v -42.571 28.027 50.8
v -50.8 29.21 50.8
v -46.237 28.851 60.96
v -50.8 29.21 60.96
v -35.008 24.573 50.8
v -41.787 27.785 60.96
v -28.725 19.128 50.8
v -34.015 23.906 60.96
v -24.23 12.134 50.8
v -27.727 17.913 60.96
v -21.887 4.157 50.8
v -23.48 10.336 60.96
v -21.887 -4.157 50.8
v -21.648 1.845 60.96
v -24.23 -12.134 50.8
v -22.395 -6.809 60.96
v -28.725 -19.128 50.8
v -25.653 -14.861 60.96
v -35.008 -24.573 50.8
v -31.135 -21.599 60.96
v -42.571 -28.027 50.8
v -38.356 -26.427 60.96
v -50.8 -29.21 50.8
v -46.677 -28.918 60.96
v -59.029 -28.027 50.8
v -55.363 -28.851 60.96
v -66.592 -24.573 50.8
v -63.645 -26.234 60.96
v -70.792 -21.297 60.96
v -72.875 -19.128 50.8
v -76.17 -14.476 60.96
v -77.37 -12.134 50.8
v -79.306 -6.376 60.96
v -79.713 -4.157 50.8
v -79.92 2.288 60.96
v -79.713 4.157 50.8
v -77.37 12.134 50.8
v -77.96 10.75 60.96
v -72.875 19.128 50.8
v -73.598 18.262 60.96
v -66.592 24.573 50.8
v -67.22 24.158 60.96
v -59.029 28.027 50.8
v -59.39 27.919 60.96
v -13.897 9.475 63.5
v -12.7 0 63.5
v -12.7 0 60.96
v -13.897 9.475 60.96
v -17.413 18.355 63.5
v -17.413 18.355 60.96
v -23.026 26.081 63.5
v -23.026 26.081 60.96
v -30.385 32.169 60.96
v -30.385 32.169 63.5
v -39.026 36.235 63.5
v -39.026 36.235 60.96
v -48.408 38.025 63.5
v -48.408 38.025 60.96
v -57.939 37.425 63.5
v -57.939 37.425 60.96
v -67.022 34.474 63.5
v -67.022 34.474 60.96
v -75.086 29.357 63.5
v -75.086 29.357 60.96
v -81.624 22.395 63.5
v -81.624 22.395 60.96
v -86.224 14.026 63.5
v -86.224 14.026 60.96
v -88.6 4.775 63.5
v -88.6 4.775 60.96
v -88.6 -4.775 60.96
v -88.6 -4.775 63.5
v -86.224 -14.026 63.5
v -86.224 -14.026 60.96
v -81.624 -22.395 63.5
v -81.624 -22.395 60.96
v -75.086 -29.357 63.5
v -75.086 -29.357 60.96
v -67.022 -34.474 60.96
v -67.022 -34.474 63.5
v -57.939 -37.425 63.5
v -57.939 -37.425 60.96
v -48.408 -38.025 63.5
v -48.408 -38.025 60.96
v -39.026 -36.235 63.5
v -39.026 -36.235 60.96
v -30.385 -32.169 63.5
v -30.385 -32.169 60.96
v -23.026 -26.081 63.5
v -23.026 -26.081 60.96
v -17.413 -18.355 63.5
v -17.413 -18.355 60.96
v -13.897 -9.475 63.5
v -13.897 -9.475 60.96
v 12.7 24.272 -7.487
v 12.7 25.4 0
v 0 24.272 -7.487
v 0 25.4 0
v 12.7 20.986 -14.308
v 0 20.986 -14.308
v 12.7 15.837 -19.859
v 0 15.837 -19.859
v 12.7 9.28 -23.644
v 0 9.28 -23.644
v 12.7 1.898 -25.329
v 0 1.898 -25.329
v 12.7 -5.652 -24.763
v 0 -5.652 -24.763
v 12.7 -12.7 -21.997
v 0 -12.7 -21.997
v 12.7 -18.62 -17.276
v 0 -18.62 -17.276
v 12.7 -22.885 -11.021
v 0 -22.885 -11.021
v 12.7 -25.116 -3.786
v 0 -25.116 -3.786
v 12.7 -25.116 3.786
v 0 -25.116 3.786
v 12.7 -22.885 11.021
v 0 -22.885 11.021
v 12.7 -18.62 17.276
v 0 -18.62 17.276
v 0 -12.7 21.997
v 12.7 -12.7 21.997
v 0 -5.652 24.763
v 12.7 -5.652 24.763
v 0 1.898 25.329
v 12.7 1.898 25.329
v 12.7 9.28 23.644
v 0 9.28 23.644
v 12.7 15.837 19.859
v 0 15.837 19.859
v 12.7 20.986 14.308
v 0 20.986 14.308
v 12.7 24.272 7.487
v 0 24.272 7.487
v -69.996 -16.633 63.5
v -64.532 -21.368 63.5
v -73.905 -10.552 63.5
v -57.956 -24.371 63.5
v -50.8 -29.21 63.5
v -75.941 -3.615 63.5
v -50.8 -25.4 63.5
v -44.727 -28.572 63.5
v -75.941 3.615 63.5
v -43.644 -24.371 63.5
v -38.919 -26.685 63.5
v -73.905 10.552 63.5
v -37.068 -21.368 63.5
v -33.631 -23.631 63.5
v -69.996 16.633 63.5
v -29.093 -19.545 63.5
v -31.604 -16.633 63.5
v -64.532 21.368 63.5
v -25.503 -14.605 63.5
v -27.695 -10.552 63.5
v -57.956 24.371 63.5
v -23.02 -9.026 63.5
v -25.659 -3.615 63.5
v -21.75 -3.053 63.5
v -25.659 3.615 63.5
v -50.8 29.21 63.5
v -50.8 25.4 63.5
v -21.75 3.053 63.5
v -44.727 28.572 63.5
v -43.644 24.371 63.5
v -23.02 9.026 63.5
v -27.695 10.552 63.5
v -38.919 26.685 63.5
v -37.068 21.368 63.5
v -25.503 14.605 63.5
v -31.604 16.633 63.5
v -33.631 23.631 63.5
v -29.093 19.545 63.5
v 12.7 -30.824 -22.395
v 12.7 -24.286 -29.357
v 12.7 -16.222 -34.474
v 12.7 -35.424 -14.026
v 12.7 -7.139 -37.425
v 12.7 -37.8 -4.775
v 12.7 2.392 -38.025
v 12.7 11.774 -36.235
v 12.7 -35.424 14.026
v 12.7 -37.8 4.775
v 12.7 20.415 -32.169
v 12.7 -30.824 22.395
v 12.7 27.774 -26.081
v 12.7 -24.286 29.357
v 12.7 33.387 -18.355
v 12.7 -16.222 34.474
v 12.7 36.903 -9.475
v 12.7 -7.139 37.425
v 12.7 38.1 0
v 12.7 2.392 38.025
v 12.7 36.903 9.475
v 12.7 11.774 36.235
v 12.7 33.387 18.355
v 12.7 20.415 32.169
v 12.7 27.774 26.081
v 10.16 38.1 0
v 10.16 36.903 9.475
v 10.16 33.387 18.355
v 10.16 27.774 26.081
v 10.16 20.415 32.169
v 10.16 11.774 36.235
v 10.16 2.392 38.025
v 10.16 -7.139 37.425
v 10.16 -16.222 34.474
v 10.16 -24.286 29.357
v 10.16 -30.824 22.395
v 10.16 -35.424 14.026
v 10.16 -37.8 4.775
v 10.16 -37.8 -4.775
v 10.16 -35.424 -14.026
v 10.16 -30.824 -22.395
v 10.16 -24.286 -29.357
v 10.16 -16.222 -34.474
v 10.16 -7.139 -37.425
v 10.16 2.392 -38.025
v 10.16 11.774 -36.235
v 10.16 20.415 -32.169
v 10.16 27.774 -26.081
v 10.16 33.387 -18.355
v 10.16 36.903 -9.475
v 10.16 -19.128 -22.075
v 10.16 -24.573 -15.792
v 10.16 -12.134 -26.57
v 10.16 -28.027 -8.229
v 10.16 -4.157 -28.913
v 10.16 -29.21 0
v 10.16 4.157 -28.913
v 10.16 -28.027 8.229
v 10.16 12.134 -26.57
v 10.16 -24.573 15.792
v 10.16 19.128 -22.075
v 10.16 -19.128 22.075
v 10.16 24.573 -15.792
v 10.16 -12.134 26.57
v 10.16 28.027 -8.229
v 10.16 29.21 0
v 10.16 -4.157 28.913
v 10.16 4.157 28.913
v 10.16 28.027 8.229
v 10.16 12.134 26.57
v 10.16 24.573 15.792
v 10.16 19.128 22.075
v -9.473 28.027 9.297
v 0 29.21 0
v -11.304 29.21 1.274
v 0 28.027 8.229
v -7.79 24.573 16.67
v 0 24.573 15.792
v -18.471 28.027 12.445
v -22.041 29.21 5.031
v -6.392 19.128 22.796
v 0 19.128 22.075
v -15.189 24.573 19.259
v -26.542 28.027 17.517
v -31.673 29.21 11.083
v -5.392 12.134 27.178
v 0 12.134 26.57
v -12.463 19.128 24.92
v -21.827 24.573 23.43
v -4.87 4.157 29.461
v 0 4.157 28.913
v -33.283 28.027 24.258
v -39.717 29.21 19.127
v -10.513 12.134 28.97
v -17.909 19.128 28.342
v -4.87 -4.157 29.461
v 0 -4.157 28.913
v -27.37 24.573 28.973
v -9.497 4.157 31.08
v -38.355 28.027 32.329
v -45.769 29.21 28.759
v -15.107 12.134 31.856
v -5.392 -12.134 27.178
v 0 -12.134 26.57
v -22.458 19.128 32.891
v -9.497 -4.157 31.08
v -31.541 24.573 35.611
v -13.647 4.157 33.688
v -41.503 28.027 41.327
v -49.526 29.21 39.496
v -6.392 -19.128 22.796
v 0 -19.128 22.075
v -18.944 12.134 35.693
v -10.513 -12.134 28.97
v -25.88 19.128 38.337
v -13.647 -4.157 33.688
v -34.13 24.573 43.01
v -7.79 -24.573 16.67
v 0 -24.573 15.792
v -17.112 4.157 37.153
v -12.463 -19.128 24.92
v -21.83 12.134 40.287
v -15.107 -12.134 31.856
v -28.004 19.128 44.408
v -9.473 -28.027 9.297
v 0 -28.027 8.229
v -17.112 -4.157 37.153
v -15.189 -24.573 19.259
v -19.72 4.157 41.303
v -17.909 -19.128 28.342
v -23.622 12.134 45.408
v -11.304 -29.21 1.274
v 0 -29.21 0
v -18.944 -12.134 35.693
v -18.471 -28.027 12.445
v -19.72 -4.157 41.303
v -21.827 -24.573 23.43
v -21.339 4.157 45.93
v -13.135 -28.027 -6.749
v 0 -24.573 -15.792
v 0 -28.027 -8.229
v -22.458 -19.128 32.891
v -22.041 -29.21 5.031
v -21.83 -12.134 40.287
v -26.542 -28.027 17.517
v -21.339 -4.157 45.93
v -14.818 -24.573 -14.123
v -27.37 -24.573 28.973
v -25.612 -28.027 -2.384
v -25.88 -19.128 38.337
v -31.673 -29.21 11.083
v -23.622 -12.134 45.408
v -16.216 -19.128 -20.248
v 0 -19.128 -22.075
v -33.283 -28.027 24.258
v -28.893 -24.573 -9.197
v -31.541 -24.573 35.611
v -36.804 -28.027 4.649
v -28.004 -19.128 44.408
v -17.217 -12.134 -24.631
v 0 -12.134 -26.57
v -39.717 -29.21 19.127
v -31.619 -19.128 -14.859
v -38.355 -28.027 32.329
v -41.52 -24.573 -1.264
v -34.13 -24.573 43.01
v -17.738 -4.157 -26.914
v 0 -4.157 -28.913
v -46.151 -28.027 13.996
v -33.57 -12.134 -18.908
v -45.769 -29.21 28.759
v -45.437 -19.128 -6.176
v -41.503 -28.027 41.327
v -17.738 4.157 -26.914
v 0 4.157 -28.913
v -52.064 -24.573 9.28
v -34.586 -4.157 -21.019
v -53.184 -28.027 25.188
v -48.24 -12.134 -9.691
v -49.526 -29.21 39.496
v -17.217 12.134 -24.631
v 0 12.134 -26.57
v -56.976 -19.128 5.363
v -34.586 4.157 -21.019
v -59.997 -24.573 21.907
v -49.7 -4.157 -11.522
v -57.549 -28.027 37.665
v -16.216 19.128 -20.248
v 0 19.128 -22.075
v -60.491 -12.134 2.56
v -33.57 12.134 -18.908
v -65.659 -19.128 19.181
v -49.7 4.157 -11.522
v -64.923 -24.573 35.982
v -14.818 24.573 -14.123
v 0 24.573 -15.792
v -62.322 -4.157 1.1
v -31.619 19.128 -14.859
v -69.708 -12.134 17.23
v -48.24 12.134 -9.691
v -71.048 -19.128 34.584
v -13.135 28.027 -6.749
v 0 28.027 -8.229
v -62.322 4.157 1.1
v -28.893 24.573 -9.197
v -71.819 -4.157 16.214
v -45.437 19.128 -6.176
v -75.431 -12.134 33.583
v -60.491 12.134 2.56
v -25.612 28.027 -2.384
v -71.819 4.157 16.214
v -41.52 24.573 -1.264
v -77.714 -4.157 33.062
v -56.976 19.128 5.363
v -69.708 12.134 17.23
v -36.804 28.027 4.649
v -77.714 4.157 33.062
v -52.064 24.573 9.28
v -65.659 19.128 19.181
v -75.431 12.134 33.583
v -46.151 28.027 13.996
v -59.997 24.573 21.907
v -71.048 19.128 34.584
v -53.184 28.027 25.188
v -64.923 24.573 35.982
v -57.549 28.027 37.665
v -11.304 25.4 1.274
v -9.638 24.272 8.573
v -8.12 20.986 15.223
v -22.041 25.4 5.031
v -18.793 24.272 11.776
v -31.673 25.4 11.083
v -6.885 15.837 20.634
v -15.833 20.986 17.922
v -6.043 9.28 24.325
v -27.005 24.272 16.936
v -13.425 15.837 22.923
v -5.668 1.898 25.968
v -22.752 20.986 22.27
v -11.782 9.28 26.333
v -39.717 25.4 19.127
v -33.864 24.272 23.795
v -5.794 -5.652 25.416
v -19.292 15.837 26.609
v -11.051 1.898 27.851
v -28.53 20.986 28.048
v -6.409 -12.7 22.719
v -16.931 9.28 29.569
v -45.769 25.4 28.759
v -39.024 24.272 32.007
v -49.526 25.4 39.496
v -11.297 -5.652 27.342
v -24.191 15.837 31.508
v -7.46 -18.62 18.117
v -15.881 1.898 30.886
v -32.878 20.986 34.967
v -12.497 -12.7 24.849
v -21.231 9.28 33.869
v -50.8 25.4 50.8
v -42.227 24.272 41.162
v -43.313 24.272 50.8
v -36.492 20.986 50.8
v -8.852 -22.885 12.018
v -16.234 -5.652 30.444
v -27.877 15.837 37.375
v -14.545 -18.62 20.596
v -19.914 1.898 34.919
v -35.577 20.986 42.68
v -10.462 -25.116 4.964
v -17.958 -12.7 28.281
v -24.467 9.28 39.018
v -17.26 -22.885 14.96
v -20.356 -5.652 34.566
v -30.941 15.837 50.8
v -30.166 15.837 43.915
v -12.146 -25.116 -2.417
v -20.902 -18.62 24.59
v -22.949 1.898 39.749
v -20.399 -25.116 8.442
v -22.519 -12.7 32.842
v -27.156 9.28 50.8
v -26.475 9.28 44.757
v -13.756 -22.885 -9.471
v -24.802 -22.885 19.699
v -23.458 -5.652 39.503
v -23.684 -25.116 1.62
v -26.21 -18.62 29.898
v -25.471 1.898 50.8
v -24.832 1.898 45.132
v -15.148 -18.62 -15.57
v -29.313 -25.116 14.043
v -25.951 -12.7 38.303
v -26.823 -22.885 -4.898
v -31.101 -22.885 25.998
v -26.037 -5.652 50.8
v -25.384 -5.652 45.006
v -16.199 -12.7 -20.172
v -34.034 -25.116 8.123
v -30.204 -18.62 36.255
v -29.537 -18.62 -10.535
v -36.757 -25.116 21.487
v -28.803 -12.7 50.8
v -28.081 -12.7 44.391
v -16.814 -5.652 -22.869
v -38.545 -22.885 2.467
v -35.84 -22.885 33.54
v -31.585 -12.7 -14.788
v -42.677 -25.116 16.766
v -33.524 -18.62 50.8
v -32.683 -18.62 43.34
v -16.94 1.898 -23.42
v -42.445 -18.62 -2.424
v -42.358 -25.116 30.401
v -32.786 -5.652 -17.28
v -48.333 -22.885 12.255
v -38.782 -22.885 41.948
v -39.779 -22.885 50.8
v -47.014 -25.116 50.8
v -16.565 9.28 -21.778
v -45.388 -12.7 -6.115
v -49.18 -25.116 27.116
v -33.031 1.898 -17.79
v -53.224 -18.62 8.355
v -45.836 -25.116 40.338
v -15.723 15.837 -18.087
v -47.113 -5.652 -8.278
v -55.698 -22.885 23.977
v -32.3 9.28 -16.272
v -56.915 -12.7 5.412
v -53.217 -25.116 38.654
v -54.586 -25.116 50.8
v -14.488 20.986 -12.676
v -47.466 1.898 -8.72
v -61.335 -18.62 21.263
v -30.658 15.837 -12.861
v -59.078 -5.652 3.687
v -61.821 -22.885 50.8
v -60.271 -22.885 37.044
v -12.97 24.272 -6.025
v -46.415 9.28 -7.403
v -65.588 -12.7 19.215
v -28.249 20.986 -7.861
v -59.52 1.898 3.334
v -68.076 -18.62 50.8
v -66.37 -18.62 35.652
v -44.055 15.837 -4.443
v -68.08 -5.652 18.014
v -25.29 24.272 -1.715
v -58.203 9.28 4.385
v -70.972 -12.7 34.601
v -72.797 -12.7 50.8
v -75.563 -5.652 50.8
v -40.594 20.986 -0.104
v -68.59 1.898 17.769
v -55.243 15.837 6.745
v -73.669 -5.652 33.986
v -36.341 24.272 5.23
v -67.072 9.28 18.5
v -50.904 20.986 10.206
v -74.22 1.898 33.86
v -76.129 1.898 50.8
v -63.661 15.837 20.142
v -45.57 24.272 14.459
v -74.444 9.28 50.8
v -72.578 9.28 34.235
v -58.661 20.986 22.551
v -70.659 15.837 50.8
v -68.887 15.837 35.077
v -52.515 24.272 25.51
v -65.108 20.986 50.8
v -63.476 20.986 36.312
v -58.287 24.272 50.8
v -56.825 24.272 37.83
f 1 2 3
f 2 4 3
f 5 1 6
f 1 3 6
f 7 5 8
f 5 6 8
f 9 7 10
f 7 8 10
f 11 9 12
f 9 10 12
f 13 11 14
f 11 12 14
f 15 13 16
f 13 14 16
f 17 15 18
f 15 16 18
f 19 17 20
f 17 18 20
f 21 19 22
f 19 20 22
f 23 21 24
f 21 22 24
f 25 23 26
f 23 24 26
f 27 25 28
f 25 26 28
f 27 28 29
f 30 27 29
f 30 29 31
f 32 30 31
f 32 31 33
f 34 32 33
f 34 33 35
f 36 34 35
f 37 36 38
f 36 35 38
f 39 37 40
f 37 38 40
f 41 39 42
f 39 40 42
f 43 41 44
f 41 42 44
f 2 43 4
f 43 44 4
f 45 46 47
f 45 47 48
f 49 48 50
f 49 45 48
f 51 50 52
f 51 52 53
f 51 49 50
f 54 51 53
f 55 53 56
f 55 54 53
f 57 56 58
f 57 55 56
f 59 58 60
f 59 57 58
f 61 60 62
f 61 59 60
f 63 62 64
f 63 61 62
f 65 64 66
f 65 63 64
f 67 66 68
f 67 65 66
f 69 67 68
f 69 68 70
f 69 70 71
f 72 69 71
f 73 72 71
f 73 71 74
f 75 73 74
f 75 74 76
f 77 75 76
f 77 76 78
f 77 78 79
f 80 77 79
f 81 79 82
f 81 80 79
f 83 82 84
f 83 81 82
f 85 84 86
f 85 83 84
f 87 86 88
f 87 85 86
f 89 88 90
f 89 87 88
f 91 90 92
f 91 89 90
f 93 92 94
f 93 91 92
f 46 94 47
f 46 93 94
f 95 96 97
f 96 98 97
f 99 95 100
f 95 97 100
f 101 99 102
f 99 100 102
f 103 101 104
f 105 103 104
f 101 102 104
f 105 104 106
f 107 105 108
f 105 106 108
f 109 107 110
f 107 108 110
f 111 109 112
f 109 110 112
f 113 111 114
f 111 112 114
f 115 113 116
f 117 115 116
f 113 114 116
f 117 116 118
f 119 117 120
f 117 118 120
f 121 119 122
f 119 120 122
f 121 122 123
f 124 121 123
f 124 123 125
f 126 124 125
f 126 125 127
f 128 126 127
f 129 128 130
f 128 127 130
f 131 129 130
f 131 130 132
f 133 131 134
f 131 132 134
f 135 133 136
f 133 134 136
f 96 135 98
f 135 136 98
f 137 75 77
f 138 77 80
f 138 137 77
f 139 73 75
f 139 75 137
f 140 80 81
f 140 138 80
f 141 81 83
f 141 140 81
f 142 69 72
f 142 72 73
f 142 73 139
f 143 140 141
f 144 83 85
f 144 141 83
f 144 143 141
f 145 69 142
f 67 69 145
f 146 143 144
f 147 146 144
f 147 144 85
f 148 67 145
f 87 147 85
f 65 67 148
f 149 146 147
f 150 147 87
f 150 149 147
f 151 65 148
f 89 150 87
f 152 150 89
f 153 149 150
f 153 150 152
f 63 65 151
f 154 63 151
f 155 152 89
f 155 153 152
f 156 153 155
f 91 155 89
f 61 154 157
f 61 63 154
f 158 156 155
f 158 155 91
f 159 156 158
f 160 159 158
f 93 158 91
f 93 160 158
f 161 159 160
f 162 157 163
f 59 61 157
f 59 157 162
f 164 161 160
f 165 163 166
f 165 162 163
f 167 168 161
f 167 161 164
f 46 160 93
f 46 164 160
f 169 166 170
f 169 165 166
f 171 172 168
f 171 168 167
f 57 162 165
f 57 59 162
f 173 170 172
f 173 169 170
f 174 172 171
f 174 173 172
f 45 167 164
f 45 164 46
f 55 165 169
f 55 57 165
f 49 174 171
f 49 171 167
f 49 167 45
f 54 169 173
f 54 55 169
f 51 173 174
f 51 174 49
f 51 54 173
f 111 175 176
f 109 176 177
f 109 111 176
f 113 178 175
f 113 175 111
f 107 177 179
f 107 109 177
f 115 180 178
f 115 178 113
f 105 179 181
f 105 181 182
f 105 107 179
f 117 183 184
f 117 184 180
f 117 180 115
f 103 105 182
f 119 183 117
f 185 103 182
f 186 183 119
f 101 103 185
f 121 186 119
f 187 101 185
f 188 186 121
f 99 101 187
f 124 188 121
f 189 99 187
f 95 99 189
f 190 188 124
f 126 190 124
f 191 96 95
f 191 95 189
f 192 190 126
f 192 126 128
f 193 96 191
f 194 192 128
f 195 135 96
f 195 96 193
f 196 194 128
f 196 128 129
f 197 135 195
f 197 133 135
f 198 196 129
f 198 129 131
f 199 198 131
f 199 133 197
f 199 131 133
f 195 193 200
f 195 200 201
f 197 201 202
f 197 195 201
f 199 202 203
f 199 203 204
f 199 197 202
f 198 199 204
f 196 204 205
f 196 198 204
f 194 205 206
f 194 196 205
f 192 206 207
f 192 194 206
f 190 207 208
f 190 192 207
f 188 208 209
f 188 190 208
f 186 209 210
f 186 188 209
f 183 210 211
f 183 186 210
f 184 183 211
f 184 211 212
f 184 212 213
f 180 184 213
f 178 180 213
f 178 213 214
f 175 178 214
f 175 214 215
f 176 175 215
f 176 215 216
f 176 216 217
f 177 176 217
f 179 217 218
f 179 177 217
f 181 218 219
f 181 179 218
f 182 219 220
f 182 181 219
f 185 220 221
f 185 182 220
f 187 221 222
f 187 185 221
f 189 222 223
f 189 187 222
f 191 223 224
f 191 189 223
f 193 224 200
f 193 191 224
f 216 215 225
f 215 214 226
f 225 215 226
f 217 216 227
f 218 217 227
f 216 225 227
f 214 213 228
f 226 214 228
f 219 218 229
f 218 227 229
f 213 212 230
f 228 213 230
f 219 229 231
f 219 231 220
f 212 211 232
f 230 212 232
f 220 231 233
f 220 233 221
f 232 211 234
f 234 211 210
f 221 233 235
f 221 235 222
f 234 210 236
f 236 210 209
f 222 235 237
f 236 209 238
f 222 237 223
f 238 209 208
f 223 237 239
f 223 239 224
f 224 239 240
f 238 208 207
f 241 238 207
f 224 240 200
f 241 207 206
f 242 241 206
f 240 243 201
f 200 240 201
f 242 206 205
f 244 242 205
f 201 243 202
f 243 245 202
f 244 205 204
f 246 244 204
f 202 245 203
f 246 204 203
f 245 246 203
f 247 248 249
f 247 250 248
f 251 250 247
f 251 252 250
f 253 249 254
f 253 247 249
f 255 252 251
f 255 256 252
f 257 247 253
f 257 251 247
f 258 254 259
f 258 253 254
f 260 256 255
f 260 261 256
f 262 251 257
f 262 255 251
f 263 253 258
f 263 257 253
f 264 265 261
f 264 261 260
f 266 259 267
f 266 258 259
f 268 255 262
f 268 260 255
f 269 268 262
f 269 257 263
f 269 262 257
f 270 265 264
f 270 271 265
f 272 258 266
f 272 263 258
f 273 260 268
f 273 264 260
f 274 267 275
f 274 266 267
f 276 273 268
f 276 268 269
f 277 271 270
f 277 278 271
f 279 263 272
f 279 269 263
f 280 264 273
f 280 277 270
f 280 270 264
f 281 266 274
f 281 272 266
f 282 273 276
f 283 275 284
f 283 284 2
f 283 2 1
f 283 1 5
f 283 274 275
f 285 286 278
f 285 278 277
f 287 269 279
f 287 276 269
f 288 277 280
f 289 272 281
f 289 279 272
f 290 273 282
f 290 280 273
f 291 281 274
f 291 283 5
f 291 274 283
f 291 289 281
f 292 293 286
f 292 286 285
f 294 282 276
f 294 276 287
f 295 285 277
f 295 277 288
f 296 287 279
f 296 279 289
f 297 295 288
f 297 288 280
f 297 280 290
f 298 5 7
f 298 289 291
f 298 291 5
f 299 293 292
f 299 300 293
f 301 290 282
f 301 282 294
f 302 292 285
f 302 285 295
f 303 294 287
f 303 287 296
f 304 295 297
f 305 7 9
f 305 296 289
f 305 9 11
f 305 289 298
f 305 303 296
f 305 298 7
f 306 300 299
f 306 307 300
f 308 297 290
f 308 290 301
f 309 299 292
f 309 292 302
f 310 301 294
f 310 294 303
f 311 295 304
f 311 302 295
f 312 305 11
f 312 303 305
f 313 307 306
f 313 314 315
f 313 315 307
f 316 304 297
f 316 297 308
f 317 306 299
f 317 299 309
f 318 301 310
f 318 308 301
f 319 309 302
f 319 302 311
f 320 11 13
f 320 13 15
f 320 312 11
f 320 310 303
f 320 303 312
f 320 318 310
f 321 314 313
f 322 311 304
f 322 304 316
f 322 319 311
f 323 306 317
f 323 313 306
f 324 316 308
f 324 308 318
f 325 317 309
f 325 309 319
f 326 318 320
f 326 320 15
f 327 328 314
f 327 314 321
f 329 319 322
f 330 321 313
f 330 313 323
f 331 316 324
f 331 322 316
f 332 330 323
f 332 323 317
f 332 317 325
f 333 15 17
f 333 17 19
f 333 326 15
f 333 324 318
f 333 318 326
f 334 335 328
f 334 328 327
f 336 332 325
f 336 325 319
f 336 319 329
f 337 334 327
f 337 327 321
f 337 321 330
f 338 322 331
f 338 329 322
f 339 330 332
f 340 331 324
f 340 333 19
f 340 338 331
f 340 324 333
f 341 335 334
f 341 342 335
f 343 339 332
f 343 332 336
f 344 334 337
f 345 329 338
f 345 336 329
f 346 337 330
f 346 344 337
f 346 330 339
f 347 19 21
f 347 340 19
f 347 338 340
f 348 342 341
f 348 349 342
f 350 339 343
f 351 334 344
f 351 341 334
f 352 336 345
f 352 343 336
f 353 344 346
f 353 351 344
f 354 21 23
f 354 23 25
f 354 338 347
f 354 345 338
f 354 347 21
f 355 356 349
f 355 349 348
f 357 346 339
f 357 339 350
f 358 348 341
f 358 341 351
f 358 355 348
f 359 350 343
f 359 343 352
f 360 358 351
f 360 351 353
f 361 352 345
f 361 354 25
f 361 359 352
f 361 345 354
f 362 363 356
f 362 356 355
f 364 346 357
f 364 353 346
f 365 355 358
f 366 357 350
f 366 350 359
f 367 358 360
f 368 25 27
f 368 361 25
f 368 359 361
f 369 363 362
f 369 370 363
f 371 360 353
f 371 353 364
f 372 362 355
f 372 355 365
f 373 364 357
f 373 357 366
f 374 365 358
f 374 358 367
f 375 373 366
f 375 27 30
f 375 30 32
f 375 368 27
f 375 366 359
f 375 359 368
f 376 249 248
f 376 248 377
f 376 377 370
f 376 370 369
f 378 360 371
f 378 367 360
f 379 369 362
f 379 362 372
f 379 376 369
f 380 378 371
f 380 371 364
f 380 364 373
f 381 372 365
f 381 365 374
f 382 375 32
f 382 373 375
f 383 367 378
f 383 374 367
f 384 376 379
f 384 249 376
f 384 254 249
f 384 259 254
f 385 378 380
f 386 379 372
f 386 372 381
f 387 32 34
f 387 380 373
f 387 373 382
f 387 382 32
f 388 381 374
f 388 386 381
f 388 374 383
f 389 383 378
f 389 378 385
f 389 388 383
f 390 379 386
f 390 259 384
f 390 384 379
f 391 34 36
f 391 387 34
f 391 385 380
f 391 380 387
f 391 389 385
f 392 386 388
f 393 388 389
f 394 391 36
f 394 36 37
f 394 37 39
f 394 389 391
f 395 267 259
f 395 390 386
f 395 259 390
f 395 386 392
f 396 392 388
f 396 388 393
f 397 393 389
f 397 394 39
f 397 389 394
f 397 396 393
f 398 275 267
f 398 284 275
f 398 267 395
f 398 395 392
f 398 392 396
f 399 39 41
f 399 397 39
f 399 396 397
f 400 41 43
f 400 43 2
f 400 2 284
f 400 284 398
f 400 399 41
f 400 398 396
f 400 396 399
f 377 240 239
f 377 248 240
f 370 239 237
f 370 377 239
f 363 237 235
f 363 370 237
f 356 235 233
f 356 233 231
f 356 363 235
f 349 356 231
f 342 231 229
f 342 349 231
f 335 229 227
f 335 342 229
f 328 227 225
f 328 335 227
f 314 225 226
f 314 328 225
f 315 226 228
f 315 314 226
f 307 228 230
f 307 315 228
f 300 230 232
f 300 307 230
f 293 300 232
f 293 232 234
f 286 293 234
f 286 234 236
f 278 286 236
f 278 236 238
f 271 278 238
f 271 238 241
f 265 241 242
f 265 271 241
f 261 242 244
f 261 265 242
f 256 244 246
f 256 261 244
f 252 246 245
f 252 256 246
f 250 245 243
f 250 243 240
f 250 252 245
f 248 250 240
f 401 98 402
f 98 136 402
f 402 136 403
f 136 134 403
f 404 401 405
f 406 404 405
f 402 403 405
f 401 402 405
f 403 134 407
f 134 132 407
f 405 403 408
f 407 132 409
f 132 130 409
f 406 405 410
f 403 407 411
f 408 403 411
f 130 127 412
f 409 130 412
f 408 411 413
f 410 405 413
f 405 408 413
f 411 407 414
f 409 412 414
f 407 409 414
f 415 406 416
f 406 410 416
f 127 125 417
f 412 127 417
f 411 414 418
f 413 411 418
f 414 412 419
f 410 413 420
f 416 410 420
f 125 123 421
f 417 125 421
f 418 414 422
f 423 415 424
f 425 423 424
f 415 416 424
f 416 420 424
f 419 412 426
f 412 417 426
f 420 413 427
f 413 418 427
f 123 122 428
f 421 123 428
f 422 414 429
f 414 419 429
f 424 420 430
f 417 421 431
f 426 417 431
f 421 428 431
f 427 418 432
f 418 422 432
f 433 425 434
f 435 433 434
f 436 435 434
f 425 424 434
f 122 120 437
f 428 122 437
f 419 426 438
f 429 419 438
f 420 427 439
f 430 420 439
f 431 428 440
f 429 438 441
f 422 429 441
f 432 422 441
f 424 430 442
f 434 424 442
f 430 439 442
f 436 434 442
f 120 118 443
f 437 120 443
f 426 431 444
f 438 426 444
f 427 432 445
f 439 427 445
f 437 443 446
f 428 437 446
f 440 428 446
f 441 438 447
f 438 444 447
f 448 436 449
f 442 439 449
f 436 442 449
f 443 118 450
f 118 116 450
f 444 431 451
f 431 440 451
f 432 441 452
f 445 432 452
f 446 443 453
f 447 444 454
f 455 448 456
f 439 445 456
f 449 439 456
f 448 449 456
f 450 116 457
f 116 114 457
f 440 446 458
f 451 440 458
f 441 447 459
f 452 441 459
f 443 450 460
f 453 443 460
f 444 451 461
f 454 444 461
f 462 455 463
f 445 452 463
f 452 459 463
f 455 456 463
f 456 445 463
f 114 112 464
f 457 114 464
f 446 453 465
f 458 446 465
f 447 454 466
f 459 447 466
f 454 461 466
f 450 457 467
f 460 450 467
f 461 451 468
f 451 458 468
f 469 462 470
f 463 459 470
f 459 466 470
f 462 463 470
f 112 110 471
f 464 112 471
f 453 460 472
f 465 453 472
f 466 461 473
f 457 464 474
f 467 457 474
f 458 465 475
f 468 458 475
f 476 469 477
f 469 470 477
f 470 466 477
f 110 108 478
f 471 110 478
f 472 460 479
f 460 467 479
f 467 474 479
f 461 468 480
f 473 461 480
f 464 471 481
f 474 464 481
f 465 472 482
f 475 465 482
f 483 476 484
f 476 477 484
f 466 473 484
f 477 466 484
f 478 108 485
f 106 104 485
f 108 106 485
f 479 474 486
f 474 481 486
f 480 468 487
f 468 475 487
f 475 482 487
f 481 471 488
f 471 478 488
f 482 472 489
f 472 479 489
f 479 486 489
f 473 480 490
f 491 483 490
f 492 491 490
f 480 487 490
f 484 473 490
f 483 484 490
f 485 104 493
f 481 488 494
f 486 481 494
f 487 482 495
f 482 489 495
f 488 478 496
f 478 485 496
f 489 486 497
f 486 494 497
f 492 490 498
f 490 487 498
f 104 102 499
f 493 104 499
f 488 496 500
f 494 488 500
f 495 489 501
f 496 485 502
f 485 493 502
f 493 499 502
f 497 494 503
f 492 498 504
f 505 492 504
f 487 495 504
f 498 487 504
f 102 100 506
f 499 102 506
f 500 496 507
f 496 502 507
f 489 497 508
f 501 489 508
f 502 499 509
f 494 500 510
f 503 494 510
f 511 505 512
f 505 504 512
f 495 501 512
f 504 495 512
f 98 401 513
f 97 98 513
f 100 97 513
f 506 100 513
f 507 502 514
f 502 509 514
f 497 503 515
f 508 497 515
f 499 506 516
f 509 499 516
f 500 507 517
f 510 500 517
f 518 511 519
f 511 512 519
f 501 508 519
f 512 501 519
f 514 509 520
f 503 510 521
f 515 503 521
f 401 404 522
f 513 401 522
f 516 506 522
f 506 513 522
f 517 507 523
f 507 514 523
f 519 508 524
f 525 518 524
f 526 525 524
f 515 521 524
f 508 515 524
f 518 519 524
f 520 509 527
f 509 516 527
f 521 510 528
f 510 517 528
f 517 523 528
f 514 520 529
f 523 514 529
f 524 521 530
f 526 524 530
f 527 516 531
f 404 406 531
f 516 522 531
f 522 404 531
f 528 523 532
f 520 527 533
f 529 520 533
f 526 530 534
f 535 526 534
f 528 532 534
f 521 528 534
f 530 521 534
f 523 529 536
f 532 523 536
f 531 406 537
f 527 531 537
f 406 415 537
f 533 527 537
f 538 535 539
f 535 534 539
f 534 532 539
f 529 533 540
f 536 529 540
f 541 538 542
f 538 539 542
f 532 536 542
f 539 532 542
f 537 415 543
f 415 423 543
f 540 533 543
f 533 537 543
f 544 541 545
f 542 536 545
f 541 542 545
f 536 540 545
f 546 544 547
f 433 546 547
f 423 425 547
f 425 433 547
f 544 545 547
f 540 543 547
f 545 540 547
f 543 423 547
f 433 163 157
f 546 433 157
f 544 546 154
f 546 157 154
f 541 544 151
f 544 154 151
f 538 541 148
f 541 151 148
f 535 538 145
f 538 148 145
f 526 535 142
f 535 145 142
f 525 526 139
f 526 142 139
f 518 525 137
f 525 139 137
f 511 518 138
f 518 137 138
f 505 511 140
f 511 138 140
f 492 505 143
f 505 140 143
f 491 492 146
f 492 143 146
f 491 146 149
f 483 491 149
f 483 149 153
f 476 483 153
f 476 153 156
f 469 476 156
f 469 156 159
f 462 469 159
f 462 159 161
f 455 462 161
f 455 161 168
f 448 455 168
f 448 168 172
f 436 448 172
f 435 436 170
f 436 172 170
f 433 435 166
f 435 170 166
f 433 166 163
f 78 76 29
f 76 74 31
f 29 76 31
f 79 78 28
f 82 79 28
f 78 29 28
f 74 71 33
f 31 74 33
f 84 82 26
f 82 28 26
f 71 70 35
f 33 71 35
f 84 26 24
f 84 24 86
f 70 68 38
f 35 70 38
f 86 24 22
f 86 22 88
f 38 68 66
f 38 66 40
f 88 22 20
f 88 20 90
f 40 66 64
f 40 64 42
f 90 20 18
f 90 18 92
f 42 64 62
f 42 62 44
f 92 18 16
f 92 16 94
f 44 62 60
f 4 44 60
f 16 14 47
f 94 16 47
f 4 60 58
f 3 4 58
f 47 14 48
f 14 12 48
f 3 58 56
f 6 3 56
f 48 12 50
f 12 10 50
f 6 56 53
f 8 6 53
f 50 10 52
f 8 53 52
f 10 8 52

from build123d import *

# Parameters (mm, degrees)
F2_R     = 29.21
F2_R_2   = 25.4
F4_R     = 38.1
F4_R_2   = 25.4
F5_DEPTH = 2.54
F6_R     = 38.1
F6_R_2   = 25.4
F7_DEPTH = 2.54


with BuildPart() as f3:
    # F3: sweep along a path in F0
    with BuildLine(Plane.XZ) as f3_path:
        Line((12.7, 0), (0, 0))
        ThreePointArc((0, 0), (-35.921024, 14.878976), (-50.8, 50.8))
        Line((-50.8, 50.8), (-50.8, 63.5))
    # F2 (on offset) → F3 (sweep)
    with BuildSketch(Plane.YZ.offset(12.7)):
        Circle(F2_R)
        Circle(F2_R_2, mode=Mode.SUBTRACT)
    sweep(path=f3_path.line)

    # F4 (on face) → F5 (join)
    with BuildSketch(Plane.YZ.offset(12.7)):
        Circle(F4_R)
        Circle(F4_R_2, mode=Mode.SUBTRACT)
    extrude(amount=-F5_DEPTH)

    # F6 (on face) → F7 (join)
    with BuildSketch(Plane.XY.offset(63.5)):
        with Locations((-50.8, 0)):
            Circle(F6_R)
        with Locations((-50.8, 0)):
            Circle(F6_R_2, mode=Mode.SUBTRACT)
    extrude(amount=-F7_DEPTH)


solid = f3.part
